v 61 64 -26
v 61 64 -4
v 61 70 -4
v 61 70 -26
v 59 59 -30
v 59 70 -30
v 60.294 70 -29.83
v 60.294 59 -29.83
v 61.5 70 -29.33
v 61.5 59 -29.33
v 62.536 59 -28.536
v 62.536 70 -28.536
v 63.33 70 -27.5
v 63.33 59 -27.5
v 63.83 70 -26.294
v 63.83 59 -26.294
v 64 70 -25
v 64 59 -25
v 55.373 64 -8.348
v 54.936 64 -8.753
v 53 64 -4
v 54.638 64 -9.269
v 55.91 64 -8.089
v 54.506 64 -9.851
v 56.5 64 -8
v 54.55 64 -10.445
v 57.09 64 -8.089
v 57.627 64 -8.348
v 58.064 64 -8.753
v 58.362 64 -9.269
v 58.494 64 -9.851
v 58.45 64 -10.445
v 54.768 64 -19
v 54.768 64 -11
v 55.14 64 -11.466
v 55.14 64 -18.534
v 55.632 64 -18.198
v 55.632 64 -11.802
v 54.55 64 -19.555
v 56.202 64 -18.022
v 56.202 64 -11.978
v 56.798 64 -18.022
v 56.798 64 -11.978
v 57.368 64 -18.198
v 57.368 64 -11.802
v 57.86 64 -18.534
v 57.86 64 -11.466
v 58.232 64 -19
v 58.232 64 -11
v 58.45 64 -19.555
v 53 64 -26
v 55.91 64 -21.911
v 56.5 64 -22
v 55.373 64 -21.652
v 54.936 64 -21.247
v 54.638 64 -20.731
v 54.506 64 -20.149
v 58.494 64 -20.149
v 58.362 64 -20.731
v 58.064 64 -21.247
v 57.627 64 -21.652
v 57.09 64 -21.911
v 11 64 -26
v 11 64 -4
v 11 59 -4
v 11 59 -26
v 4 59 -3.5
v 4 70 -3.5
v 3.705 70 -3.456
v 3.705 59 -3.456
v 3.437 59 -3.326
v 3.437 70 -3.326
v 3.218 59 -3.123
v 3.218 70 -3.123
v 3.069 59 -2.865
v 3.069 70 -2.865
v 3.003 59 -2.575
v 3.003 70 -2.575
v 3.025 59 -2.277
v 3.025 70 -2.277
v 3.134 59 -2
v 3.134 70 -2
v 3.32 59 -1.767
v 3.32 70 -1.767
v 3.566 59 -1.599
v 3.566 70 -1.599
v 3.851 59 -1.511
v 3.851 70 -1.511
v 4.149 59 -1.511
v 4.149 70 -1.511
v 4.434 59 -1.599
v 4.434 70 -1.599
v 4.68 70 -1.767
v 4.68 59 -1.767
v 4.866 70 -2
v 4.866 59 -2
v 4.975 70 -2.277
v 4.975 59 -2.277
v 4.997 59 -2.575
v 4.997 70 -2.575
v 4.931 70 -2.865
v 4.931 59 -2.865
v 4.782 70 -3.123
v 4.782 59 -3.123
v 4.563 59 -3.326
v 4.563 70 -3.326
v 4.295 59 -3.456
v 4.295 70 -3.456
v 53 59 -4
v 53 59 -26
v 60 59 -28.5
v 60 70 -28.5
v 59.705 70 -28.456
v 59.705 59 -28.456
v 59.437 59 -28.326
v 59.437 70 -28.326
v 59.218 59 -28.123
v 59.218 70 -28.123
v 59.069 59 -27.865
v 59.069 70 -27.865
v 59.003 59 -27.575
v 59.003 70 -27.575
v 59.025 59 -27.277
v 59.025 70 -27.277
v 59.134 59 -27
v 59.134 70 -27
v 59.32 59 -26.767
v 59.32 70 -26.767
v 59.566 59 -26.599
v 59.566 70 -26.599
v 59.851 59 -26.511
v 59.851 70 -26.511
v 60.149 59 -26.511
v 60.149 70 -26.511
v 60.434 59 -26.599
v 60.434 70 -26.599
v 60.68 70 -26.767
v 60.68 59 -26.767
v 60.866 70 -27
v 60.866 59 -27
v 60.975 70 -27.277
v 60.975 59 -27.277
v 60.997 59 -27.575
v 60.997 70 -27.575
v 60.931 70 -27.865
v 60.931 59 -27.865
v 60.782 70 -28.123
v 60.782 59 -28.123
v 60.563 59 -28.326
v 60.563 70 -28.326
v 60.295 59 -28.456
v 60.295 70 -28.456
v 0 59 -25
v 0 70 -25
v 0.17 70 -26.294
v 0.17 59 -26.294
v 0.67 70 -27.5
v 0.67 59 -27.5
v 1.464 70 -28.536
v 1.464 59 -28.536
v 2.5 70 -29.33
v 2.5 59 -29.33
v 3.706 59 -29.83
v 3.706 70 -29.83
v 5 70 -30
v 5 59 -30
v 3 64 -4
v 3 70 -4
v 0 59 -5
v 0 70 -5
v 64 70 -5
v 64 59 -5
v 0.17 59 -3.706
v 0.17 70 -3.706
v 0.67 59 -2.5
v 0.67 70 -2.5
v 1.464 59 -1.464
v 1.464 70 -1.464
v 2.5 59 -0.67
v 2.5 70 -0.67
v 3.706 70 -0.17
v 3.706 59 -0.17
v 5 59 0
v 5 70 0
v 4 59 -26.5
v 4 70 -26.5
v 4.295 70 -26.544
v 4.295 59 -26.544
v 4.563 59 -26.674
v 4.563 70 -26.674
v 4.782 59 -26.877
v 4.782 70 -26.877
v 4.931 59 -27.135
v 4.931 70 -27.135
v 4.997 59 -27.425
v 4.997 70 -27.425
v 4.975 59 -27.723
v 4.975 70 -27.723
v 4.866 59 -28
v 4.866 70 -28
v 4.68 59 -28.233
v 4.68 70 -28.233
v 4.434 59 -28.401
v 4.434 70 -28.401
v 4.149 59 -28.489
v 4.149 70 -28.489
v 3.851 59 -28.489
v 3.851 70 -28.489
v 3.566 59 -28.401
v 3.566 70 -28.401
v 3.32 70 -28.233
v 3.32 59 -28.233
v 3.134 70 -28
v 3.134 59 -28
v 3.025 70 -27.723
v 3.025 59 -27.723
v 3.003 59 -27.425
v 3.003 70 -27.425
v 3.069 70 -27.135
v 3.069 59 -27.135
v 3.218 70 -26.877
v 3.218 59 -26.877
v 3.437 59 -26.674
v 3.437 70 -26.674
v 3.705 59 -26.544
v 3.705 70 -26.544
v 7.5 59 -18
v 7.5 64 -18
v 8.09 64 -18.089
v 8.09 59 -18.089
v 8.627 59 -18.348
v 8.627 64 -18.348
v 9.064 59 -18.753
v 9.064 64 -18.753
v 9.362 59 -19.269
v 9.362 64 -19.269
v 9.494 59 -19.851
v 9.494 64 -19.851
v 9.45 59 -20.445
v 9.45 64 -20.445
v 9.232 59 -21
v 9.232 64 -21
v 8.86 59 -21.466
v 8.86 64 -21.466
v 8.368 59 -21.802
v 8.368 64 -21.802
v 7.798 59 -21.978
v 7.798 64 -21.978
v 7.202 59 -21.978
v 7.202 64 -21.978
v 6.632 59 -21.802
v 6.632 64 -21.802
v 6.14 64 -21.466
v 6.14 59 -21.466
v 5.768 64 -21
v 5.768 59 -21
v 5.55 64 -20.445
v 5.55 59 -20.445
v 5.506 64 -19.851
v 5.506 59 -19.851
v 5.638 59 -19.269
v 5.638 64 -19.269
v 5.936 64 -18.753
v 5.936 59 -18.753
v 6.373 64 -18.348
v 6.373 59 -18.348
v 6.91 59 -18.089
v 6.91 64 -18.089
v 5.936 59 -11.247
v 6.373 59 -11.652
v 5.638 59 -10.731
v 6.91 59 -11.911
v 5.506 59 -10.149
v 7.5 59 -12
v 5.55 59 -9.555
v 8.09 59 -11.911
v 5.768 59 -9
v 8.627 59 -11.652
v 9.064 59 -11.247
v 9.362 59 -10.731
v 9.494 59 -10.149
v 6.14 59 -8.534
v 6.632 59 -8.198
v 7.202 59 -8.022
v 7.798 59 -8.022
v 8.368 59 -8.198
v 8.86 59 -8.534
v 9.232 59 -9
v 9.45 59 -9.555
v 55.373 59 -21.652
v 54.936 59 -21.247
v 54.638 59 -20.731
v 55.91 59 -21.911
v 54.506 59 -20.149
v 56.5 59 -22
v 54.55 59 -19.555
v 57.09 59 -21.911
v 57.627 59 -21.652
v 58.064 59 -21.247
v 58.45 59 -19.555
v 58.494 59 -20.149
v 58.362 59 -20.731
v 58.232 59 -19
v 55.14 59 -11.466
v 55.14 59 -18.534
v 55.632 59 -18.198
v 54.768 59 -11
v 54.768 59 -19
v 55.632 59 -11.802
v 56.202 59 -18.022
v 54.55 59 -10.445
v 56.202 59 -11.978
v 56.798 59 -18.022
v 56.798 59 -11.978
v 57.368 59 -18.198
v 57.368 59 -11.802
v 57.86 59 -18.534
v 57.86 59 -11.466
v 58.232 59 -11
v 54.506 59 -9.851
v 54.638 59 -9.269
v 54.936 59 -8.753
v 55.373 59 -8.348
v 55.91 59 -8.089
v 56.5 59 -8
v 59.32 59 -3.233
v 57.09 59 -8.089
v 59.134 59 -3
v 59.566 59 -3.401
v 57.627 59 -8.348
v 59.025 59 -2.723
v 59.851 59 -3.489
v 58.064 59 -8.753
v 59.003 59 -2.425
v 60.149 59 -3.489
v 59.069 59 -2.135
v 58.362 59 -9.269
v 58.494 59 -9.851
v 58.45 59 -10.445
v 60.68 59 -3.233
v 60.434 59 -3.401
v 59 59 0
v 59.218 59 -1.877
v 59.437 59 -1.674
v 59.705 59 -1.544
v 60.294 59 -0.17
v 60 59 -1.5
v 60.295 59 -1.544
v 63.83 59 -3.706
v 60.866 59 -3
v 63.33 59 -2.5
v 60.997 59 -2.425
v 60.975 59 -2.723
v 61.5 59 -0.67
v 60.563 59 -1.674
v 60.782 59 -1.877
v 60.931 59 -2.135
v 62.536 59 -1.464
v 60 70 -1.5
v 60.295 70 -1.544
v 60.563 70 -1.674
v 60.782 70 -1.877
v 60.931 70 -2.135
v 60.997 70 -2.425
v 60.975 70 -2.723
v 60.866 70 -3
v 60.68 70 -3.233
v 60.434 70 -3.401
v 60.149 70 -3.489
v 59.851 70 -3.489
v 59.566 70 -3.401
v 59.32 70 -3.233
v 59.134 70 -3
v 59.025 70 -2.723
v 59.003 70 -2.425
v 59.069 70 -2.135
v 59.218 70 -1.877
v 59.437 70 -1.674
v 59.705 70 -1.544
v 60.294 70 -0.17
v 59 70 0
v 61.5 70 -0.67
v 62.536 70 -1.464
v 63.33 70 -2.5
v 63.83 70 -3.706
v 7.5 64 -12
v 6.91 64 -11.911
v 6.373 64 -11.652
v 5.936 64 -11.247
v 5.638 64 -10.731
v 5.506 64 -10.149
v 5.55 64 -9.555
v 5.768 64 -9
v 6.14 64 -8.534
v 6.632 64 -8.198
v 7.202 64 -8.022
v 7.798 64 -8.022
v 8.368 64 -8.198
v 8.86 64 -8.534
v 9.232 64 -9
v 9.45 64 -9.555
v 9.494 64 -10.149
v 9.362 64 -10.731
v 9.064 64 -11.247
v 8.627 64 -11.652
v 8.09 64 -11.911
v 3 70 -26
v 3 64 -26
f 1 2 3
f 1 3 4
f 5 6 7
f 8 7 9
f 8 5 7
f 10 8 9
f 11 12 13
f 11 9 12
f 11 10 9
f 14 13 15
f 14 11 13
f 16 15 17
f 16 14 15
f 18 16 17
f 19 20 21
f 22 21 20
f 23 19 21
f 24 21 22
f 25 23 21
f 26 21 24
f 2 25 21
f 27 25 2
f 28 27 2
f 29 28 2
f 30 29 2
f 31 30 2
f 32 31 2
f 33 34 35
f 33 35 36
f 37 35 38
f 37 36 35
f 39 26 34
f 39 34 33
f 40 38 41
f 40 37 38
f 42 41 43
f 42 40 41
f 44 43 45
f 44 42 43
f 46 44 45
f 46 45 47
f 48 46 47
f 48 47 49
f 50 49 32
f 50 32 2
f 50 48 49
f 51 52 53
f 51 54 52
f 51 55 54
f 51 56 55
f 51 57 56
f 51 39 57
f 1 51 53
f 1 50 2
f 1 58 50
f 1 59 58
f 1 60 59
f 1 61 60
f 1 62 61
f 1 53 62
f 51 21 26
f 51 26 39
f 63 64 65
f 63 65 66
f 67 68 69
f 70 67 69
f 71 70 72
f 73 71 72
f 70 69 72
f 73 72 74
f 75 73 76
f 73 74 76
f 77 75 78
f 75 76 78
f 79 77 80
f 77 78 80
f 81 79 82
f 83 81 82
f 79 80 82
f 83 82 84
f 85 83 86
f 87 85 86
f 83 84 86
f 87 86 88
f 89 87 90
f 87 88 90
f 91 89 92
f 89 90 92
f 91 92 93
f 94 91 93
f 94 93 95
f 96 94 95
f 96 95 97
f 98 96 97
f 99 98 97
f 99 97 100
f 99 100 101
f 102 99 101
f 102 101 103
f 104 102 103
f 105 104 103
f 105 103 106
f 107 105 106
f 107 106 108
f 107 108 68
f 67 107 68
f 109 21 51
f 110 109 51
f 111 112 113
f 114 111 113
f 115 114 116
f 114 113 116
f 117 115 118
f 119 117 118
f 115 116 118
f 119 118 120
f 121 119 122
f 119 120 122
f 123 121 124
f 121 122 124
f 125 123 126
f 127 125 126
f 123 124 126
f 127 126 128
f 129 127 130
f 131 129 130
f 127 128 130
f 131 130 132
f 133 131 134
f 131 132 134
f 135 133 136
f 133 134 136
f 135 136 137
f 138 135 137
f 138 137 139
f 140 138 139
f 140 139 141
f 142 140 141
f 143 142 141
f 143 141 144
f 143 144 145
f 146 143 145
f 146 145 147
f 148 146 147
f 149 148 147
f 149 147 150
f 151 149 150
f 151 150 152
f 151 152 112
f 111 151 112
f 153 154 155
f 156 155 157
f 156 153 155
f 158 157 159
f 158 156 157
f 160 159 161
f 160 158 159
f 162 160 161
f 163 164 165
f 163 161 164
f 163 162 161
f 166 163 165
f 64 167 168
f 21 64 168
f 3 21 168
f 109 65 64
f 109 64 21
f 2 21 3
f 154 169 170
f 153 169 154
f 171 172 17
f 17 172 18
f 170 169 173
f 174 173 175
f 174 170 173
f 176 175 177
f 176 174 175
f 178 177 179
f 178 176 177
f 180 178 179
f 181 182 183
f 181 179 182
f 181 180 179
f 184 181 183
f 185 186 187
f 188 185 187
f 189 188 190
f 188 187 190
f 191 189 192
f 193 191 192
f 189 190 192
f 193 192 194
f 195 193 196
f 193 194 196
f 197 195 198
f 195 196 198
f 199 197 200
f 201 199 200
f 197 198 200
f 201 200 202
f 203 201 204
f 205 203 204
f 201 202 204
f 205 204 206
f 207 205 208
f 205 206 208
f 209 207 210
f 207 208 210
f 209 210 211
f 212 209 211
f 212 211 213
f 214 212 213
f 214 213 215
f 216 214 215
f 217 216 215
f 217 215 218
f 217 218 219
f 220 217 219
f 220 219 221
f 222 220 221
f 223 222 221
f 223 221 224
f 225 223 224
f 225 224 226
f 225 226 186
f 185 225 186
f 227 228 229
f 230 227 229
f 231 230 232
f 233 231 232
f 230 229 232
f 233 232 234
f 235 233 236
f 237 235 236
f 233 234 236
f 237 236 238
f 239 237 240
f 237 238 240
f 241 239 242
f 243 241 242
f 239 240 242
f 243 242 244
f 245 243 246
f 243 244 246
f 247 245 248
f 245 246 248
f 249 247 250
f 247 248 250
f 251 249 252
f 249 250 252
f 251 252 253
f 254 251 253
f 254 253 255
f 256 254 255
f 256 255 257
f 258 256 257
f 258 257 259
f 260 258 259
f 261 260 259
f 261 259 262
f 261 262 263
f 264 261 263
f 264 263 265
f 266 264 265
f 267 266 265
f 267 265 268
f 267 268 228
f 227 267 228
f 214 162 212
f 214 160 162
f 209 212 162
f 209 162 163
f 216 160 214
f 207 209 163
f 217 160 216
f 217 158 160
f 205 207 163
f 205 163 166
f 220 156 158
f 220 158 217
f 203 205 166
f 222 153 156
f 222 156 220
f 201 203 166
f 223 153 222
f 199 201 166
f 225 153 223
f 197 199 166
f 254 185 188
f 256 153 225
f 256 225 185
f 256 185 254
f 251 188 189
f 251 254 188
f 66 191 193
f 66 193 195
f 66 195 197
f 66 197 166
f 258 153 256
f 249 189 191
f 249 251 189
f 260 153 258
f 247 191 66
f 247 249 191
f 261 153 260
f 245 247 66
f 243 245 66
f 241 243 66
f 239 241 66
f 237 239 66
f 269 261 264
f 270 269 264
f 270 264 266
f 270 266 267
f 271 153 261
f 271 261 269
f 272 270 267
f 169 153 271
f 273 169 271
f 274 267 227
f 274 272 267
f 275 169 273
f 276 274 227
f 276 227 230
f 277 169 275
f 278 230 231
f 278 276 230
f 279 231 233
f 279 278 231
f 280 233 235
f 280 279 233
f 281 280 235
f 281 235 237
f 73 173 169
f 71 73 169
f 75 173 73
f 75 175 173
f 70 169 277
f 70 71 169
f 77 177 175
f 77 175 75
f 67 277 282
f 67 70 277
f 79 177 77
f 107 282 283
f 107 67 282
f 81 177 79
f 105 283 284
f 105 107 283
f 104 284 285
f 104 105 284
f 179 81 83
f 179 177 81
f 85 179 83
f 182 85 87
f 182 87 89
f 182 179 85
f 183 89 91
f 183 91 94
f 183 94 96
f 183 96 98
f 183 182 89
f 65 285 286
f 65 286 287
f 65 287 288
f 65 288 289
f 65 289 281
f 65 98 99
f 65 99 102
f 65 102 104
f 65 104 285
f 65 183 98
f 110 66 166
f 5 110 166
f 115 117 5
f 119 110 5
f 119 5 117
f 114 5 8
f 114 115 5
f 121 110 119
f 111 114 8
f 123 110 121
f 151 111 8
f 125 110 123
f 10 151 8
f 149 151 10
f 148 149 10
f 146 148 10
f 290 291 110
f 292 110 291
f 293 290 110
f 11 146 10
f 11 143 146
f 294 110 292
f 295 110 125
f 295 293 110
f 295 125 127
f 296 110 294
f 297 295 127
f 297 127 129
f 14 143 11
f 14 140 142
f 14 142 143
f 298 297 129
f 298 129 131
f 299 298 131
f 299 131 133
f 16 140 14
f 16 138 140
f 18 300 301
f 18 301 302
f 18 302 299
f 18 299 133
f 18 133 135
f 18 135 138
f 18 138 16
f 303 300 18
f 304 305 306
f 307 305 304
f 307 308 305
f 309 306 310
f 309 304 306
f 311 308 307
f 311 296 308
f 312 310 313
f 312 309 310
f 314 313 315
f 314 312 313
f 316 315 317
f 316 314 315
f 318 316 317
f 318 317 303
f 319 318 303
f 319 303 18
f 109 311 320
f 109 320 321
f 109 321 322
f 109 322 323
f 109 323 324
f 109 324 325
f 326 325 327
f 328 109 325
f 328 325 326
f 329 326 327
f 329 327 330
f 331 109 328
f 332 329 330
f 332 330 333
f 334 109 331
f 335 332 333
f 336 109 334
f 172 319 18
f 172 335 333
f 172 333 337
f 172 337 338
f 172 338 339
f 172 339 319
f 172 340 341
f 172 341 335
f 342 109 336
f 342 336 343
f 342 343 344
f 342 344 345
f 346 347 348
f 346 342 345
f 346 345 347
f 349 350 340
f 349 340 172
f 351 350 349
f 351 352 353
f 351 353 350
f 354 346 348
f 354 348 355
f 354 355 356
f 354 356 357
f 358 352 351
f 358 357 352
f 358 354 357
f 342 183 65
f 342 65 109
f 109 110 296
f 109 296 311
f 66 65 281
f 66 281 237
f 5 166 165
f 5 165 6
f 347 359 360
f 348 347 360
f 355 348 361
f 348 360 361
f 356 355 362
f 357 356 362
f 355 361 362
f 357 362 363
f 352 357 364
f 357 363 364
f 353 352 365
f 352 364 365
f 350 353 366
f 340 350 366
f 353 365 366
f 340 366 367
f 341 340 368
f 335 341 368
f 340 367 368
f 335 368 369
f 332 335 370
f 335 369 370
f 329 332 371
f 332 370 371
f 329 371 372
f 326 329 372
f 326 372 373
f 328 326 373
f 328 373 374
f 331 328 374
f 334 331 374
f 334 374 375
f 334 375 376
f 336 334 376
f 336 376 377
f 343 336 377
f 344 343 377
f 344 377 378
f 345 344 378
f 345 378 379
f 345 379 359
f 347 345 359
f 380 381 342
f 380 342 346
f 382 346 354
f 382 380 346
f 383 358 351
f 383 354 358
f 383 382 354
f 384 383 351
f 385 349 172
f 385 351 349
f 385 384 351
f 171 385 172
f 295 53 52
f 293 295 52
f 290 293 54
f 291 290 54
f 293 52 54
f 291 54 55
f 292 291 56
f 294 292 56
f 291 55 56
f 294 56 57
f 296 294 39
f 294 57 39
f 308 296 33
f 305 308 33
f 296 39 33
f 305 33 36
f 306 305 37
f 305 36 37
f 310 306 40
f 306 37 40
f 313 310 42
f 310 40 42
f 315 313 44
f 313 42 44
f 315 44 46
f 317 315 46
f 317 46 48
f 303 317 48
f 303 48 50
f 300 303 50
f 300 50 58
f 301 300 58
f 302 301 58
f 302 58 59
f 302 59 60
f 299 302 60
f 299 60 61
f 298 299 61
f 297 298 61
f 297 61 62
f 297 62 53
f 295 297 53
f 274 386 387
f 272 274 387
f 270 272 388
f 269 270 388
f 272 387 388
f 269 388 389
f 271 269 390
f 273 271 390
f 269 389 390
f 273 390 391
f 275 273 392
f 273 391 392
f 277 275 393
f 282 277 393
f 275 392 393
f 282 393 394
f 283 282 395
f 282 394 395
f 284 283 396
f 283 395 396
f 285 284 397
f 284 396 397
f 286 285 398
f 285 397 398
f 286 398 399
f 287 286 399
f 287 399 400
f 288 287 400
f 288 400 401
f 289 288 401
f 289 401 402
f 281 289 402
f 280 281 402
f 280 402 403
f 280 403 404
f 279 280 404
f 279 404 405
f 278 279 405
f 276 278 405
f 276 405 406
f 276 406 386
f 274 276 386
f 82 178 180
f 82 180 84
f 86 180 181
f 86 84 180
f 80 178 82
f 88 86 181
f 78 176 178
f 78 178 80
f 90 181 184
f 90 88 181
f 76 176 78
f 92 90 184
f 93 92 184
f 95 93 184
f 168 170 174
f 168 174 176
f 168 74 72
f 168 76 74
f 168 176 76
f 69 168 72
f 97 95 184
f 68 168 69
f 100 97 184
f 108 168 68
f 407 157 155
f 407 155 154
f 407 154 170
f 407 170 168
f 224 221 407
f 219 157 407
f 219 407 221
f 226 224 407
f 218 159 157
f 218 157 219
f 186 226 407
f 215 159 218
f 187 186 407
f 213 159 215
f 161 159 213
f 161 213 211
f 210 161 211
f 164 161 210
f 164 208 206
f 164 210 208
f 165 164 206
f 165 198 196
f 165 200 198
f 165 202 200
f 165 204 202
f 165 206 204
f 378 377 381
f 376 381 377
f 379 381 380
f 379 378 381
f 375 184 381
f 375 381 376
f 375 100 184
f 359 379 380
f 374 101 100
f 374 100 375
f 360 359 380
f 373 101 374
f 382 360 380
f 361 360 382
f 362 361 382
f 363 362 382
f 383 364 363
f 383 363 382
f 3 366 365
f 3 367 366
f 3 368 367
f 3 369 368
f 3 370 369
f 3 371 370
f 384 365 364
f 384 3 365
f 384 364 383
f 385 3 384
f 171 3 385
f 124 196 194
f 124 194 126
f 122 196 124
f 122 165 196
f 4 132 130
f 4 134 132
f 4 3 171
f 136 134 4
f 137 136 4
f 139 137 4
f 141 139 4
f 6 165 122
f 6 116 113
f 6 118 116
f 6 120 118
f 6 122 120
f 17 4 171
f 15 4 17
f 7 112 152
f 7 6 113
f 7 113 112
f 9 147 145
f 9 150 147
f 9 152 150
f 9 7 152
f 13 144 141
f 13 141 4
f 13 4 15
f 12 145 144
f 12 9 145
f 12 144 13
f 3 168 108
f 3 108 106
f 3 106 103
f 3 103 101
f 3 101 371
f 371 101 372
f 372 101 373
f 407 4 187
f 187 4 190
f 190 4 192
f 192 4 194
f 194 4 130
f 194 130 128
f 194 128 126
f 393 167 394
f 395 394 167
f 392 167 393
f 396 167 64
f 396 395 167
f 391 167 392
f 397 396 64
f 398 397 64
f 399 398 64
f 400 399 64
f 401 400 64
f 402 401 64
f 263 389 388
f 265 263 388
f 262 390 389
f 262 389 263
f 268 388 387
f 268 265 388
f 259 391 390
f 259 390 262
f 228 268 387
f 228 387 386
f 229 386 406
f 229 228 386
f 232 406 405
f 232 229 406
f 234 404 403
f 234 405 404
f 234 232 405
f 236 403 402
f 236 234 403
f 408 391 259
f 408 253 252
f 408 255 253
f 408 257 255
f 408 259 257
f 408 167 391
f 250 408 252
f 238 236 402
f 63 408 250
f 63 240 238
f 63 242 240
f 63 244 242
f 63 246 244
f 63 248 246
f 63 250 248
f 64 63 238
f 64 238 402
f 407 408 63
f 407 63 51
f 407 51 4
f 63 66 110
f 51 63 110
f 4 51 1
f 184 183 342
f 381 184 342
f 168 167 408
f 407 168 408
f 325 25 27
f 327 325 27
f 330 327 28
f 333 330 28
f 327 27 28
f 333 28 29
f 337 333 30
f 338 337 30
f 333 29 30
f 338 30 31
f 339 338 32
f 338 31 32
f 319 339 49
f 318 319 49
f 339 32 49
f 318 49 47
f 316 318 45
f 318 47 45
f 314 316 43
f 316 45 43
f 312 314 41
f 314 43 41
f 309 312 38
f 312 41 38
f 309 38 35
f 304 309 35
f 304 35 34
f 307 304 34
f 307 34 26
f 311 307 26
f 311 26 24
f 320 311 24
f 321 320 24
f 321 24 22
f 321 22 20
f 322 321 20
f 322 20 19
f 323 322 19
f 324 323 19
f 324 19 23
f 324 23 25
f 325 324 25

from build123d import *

# Parameters (mm, degrees)
SKETCH2_W           = 64
SKETCH2_H           = 30
BOSS_EXTRUDE1_DEPTH = 64
CUT_EXTRUDE1_REACH  = 97.352
SKETCH3_W           = 42
SKETCH3_H           = 22
CUT_EXTRUDE2_REACH  = 97.352
SKETCH4_R           = 2
SKETCH5_W           = 64
SKETCH5_H           = 30
SKETCH5_W_2         = 58
SKETCH5_H_2         = 22
BOSS_EXTRUDE2_DEPTH = 12
CUT_EXTRUDE3_REACH  = 105.788
SKETCH6_R           = 1
FILLET1_R           = 5
CUT_EXTRUDE4_DEPTH  = 59
CUT_EXTRUDE7_DEPTH  = 6


with BuildPart() as part:
    # Sketch2 → Boss-Extrude1 (new body)
    with BuildSketch(Plane(origin=(0, 0, 0), x_dir=(1, 0, 0), z_dir=(0, 1, 0))):
        with Locations((32, 15)):
            Rectangle(SKETCH2_W, SKETCH2_H)
    extrude(amount=BOSS_EXTRUDE1_DEPTH)

    # Sketch3 → Cut-Extrude1 (cut, up to next)
    with BuildSketch(Plane(origin=(0, 64, 0), x_dir=(1, 0, 0), z_dir=(0, 1, 0)), mode=Mode.PRIVATE) as cut_extrude1_sk1:
        with Locations((32, 15)):
            Rectangle(SKETCH3_W, SKETCH3_H)
    cut_extrude1_tool1 = extrude(cut_extrude1_sk1.sketch, amount=-CUT_EXTRUDE1_REACH, mode=Mode.PRIVATE) & part.part
    add(cut_extrude1_tool1.solids().sort_by_distance((32, 64, -15))[0], mode=Mode.SUBTRACT)

    # Sketch4 → Cut-Extrude2 (cut, up to next)
    with BuildSketch(Plane(origin=(0, 64, 0), x_dir=(1, 0, 0), z_dir=(0, 1, 0)), mode=Mode.PRIVATE) as cut_extrude2_sk1:
        with Locations(Location((7.5, 20, 0), (0, 0, 270))):
            Circle(SKETCH4_R)
    cut_extrude2_tool1 = extrude(cut_extrude2_sk1.sketch, amount=-CUT_EXTRUDE2_REACH, mode=Mode.PRIVATE) & part.part
    # Sketch4 → Cut-Extrude2 (cut, up to next)
    with BuildSketch(Plane(origin=(0, 64, 0), x_dir=(1, 0, 0), z_dir=(0, 1, 0)), mode=Mode.PRIVATE) as cut_extrude2_sk2:
        with Locations(Location((7.5, 10, 0), (0, 0, 90))):
            Circle(SKETCH4_R)
    cut_extrude2_tool2 = extrude(cut_extrude2_sk2.sketch, amount=-CUT_EXTRUDE2_REACH, mode=Mode.PRIVATE) & part.part
    # Sketch4 → Cut-Extrude2 (cut, up to next)
    with BuildSketch(Plane(origin=(0, 64, 0), x_dir=(1, 0, 0), z_dir=(0, 1, 0)), mode=Mode.PRIVATE) as cut_extrude2_sk3:
        with Locations(Location((56.5, 10, 0), (0, 0, 270))):
            Circle(SKETCH4_R)
    cut_extrude2_tool3 = extrude(cut_extrude2_sk3.sketch, amount=-CUT_EXTRUDE2_REACH, mode=Mode.PRIVATE) & part.part
    # Sketch4 → Cut-Extrude2 (cut, up to next)
    with BuildSketch(Plane(origin=(0, 64, 0), x_dir=(1, 0, 0), z_dir=(0, 1, 0)), mode=Mode.PRIVATE) as cut_extrude2_sk4:
        with Locations(Location((56.5, 20, 0), (0, 0, 90))):
            Circle(SKETCH4_R)
    cut_extrude2_tool4 = extrude(cut_extrude2_sk4.sketch, amount=-CUT_EXTRUDE2_REACH, mode=Mode.PRIVATE) & part.part
    add(cut_extrude2_tool1.solids().sort_by_distance((7.5, 64, -20))[0], mode=Mode.SUBTRACT)
    add(cut_extrude2_tool2.solids().sort_by_distance((7.5, 64, -10))[0], mode=Mode.SUBTRACT)
    add(cut_extrude2_tool3.solids().sort_by_distance((56.5, 64, -10))[0], mode=Mode.SUBTRACT)
    add(cut_extrude2_tool4.solids().sort_by_distance((56.5, 64, -20))[0], mode=Mode.SUBTRACT)

    # Sketch5 → Boss-Extrude2 (add)
    with BuildSketch(Plane(origin=(0, 64, 0), x_dir=(1, 0, 0), z_dir=(0, 1, 0))):
        with Locations((32, 15)):
            Rectangle(SKETCH5_W, SKETCH5_H)
        with Locations((32, 15)):
            Rectangle(SKETCH5_W_2, SKETCH5_H_2, mode=Mode.SUBTRACT)
    extrude(amount=BOSS_EXTRUDE2_DEPTH)

    # Sketch6 → Cut-Extrude3 (cut, up to next)
    with BuildSketch(Plane(origin=(0, 76, 0), x_dir=(1, 0, 0), z_dir=(0, 1, 0)), mode=Mode.PRIVATE) as cut_extrude3_sk1:
        with Locations(Location((4, 27.5, 0), (0, 0, 270))):
            Circle(SKETCH6_R)
    cut_extrude3_tool1 = extrude(cut_extrude3_sk1.sketch, amount=-CUT_EXTRUDE3_REACH, mode=Mode.PRIVATE) & part.part
    # Sketch6 → Cut-Extrude3 (cut, up to next)
    with BuildSketch(Plane(origin=(0, 76, 0), x_dir=(1, 0, 0), z_dir=(0, 1, 0)), mode=Mode.PRIVATE) as cut_extrude3_sk2:
        with Locations(Location((4, 2.5, 0), (0, 0, 90))):
            Circle(SKETCH6_R)
    cut_extrude3_tool2 = extrude(cut_extrude3_sk2.sketch, amount=-CUT_EXTRUDE3_REACH, mode=Mode.PRIVATE) & part.part
    # Sketch6 → Cut-Extrude3 (cut, up to next)
    with BuildSketch(Plane(origin=(0, 76, 0), x_dir=(1, 0, 0), z_dir=(0, 1, 0)), mode=Mode.PRIVATE) as cut_extrude3_sk3:
        with Locations(Location((60, 2.5, 0), (0, 0, 270))):
            Circle(SKETCH6_R)
    cut_extrude3_tool3 = extrude(cut_extrude3_sk3.sketch, amount=-CUT_EXTRUDE3_REACH, mode=Mode.PRIVATE) & part.part
    # Sketch6 → Cut-Extrude3 (cut, up to next)
    with BuildSketch(Plane(origin=(0, 76, 0), x_dir=(1, 0, 0), z_dir=(0, 1, 0)), mode=Mode.PRIVATE) as cut_extrude3_sk4:
        with Locations(Location((60, 27.5, 0), (0, 0, 90))):
            Circle(SKETCH6_R)
    cut_extrude3_tool4 = extrude(cut_extrude3_sk4.sketch, amount=-CUT_EXTRUDE3_REACH, mode=Mode.PRIVATE) & part.part
    add(cut_extrude3_tool1.solids().sort_by_distance((4, 76, -27.5))[0], mode=Mode.SUBTRACT)
    add(cut_extrude3_tool2.solids().sort_by_distance((4, 76, -2.5))[0], mode=Mode.SUBTRACT)
    add(cut_extrude3_tool3.solids().sort_by_distance((60, 76, -2.5))[0], mode=Mode.SUBTRACT)
    add(cut_extrude3_tool4.solids().sort_by_distance((60, 76, -27.5))[0], mode=Mode.SUBTRACT)

    # Fillet1
    fillet1_edges = [part.edges().sort_by_distance(p)[0] for p in [
        (0, 38, -30),
        (64, 38, -30),
        (64, 38, 0),
        (0, 38, 0),
    ]]
    fillet(fillet1_edges, radius=FILLET1_R)

    # Sketch7 → Cut-Extrude4 (cut)
    with BuildSketch(Plane.XZ):
        with BuildLine():
            Line((5, -30), (59, -30))
            ThreePointArc((59, -30), (62.535533906, -28.535533906), (64, -25))
            Line((64, -25), (64, -5))
            ThreePointArc((64, -5), (62.535533906, -1.464466094), (59, 0))
            Line((59, 0), (5, 0))
            ThreePointArc((5, 0), (1.464466094, -1.464466094), (0, -5))
            Line((0, -5), (0, -25))
            ThreePointArc((0, -25), (1.464466094, -28.535533906), (5, -30))
        make_face()
    extrude(amount=-CUT_EXTRUDE4_DEPTH, mode=Mode.SUBTRACT)

    # Sketch10 → Cut-Extrude7 (cut)
    with BuildSketch(Plane(origin=(0, 76, 0), x_dir=(1, 0, 0), z_dir=(0, 1, 0))):
        with BuildLine():
            Line((64, 5), (64, 25))
            ThreePointArc((64, 25), (62.535533906, 28.535533906), (59, 30))
            Line((59, 30), (5, 30))
            ThreePointArc((5, 30), (1.464466094, 28.535533906), (0, 25))
            Line((0, 25), (0, 5))
            ThreePointArc((0, 5), (1.464466094, 1.464466094), (5, 0))
            Line((5, 0), (59, 0))
            ThreePointArc((59, 0), (62.535533906, 1.464466094), (64, 5))
        make_face()
    extrude(amount=-CUT_EXTRUDE7_DEPTH, mode=Mode.SUBTRACT)


solid = part.part
